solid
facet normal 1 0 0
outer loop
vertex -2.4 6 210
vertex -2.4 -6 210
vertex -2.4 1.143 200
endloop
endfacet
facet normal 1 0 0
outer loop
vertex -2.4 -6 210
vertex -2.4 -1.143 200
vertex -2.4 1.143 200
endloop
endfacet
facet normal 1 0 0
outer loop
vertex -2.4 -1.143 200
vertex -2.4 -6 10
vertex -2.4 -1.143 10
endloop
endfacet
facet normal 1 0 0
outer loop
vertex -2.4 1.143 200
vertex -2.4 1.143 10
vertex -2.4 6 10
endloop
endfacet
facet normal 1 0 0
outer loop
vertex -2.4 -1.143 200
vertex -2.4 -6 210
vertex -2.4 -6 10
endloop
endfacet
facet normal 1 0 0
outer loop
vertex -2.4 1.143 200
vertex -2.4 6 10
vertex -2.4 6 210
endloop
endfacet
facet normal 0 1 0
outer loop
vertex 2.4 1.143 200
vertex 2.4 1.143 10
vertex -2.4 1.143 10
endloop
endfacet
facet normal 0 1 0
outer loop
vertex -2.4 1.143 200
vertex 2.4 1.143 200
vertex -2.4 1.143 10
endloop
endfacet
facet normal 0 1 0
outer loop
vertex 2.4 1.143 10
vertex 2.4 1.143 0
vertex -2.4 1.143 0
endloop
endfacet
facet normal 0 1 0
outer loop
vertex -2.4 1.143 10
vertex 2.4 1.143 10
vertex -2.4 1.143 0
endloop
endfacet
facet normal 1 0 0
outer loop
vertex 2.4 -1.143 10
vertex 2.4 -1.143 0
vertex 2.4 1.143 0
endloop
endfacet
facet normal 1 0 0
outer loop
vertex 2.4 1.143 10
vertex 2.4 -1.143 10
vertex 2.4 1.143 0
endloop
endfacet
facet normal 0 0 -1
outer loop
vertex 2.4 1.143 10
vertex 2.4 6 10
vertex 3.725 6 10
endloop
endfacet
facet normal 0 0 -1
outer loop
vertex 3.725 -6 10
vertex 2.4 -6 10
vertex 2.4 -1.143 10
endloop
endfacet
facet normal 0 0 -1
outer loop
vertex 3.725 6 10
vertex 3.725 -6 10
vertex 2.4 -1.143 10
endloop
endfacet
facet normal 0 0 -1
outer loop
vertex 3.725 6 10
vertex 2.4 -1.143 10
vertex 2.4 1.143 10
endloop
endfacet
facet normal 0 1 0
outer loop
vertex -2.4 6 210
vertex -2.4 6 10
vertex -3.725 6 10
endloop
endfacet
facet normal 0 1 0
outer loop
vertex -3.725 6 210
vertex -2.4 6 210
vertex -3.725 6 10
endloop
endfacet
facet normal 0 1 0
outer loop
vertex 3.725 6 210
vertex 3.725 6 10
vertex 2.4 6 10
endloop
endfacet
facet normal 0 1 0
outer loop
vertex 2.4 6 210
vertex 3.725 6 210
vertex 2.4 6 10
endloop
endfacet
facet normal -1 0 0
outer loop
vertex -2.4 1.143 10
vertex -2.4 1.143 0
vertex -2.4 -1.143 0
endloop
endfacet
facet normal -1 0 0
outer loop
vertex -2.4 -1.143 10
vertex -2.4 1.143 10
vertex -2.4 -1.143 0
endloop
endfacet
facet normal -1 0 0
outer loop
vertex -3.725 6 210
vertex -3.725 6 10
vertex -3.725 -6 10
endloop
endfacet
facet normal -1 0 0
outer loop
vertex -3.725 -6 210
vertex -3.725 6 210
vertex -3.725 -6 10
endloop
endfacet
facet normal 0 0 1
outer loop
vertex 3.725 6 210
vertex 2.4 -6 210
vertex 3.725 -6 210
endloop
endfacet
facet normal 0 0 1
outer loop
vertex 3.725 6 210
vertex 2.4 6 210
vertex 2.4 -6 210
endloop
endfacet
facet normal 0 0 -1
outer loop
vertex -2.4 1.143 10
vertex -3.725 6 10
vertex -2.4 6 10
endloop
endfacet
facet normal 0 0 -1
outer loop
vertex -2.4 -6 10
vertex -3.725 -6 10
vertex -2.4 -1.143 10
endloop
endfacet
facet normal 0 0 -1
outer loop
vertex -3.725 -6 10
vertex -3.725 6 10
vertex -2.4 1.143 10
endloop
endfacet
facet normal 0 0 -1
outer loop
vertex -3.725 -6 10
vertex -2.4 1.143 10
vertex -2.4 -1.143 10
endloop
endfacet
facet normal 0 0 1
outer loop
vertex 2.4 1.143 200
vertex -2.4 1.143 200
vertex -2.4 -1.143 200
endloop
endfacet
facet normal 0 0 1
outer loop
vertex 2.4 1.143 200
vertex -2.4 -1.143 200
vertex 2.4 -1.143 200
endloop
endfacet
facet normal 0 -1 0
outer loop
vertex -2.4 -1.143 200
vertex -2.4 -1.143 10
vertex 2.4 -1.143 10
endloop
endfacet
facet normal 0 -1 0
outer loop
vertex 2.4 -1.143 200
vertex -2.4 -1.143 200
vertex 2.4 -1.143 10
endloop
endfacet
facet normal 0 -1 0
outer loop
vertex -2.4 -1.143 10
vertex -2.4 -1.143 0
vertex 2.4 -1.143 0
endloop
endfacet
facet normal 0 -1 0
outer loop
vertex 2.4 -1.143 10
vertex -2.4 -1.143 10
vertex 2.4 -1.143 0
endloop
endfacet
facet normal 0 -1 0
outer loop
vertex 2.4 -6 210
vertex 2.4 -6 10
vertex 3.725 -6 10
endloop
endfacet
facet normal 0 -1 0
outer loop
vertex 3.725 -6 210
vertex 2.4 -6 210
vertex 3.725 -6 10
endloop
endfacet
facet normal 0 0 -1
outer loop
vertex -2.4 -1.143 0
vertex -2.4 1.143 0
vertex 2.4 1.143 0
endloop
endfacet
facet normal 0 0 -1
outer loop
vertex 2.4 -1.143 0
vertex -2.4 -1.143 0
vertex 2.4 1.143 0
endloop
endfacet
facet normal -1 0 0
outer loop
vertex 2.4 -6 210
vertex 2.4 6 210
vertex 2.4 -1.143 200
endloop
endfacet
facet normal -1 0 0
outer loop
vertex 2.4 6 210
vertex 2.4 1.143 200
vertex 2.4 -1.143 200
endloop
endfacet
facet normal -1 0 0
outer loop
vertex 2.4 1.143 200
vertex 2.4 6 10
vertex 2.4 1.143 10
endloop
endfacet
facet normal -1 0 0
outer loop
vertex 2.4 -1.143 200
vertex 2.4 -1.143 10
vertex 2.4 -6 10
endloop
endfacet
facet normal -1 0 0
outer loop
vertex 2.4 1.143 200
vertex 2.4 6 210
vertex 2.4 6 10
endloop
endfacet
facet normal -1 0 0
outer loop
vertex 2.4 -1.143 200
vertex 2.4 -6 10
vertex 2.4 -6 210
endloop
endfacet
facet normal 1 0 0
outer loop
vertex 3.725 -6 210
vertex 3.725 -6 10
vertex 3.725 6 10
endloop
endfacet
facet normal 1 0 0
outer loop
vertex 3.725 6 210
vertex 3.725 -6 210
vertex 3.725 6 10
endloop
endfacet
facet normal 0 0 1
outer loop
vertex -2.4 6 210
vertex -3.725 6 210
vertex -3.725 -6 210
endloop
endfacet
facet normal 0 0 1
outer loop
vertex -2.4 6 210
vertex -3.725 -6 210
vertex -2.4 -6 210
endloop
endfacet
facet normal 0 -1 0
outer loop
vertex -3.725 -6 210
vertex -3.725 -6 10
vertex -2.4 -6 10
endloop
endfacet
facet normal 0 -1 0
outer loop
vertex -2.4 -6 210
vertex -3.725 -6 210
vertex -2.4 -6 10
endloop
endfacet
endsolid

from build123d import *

# Parameters (mm, degrees)
F1_DEPTH = 200
F3_DEPTH = 10
F5_DEPTH = 10


with BuildPart() as f1:
    # F0 (on Top) → F1 (new body)
    with BuildSketch(Plane.XY):
        Polygon((2.4, 1.1429430888), (0, 1.1429430888), (-2.4, 1.1429430888), (-2.4, 6), (-3.7251238391, 6), (-3.7251238391, 0), (-3.7251238391, -6), (-2.4, -6), (-2.4, -1.1429430888), (0, -1.1429430888), (2.4, -1.1429430888), (2.4, -6), (3.7251238391, -6), (3.7251238391, 0), (3.7251238391, 6), (2.4, 6), align=None)
    extrude(amount=F1_DEPTH)

    # F2 (on face) → F3 (join)
    with BuildSketch(Plane.XY.offset(200)):
        Polygon((-2.4, -6), (-2.4, -1.1429430888), (-2.4, 1.1429430888), (-2.4, 6), (-3.7251238391, 6), (-3.7251238391, -6), align=None)
        Polygon((2.4, 1.1429430888), (2.4, -1.1429430888), (2.4, -6), (3.7251238391, -6), (3.7251238391, 6), (2.4, 6), align=None)
    extrude(amount=F3_DEPTH)

    # F4 (on face) → F5 (cut)
    with BuildSketch(Plane(origin=(0, 0, 0), x_dir=(1, 0, 0), z_dir=(0, 0, -1))):
        Polygon((2.4, 1.1429430888), (2.4, -1.1429430888), (2.4, -6), (3.7251238391, -6), (3.7251238391, 6), (2.4, 6), align=None)
        Polygon((-2.4, -6), (-2.4, -1.1429430888), (-2.4, 1.1429430888), (-2.4, 6), (-3.7251238391, 6), (-3.7251238391, -6), align=None)
    extrude(amount=-F5_DEPTH, mode=Mode.SUBTRACT)


solid = f1.part
